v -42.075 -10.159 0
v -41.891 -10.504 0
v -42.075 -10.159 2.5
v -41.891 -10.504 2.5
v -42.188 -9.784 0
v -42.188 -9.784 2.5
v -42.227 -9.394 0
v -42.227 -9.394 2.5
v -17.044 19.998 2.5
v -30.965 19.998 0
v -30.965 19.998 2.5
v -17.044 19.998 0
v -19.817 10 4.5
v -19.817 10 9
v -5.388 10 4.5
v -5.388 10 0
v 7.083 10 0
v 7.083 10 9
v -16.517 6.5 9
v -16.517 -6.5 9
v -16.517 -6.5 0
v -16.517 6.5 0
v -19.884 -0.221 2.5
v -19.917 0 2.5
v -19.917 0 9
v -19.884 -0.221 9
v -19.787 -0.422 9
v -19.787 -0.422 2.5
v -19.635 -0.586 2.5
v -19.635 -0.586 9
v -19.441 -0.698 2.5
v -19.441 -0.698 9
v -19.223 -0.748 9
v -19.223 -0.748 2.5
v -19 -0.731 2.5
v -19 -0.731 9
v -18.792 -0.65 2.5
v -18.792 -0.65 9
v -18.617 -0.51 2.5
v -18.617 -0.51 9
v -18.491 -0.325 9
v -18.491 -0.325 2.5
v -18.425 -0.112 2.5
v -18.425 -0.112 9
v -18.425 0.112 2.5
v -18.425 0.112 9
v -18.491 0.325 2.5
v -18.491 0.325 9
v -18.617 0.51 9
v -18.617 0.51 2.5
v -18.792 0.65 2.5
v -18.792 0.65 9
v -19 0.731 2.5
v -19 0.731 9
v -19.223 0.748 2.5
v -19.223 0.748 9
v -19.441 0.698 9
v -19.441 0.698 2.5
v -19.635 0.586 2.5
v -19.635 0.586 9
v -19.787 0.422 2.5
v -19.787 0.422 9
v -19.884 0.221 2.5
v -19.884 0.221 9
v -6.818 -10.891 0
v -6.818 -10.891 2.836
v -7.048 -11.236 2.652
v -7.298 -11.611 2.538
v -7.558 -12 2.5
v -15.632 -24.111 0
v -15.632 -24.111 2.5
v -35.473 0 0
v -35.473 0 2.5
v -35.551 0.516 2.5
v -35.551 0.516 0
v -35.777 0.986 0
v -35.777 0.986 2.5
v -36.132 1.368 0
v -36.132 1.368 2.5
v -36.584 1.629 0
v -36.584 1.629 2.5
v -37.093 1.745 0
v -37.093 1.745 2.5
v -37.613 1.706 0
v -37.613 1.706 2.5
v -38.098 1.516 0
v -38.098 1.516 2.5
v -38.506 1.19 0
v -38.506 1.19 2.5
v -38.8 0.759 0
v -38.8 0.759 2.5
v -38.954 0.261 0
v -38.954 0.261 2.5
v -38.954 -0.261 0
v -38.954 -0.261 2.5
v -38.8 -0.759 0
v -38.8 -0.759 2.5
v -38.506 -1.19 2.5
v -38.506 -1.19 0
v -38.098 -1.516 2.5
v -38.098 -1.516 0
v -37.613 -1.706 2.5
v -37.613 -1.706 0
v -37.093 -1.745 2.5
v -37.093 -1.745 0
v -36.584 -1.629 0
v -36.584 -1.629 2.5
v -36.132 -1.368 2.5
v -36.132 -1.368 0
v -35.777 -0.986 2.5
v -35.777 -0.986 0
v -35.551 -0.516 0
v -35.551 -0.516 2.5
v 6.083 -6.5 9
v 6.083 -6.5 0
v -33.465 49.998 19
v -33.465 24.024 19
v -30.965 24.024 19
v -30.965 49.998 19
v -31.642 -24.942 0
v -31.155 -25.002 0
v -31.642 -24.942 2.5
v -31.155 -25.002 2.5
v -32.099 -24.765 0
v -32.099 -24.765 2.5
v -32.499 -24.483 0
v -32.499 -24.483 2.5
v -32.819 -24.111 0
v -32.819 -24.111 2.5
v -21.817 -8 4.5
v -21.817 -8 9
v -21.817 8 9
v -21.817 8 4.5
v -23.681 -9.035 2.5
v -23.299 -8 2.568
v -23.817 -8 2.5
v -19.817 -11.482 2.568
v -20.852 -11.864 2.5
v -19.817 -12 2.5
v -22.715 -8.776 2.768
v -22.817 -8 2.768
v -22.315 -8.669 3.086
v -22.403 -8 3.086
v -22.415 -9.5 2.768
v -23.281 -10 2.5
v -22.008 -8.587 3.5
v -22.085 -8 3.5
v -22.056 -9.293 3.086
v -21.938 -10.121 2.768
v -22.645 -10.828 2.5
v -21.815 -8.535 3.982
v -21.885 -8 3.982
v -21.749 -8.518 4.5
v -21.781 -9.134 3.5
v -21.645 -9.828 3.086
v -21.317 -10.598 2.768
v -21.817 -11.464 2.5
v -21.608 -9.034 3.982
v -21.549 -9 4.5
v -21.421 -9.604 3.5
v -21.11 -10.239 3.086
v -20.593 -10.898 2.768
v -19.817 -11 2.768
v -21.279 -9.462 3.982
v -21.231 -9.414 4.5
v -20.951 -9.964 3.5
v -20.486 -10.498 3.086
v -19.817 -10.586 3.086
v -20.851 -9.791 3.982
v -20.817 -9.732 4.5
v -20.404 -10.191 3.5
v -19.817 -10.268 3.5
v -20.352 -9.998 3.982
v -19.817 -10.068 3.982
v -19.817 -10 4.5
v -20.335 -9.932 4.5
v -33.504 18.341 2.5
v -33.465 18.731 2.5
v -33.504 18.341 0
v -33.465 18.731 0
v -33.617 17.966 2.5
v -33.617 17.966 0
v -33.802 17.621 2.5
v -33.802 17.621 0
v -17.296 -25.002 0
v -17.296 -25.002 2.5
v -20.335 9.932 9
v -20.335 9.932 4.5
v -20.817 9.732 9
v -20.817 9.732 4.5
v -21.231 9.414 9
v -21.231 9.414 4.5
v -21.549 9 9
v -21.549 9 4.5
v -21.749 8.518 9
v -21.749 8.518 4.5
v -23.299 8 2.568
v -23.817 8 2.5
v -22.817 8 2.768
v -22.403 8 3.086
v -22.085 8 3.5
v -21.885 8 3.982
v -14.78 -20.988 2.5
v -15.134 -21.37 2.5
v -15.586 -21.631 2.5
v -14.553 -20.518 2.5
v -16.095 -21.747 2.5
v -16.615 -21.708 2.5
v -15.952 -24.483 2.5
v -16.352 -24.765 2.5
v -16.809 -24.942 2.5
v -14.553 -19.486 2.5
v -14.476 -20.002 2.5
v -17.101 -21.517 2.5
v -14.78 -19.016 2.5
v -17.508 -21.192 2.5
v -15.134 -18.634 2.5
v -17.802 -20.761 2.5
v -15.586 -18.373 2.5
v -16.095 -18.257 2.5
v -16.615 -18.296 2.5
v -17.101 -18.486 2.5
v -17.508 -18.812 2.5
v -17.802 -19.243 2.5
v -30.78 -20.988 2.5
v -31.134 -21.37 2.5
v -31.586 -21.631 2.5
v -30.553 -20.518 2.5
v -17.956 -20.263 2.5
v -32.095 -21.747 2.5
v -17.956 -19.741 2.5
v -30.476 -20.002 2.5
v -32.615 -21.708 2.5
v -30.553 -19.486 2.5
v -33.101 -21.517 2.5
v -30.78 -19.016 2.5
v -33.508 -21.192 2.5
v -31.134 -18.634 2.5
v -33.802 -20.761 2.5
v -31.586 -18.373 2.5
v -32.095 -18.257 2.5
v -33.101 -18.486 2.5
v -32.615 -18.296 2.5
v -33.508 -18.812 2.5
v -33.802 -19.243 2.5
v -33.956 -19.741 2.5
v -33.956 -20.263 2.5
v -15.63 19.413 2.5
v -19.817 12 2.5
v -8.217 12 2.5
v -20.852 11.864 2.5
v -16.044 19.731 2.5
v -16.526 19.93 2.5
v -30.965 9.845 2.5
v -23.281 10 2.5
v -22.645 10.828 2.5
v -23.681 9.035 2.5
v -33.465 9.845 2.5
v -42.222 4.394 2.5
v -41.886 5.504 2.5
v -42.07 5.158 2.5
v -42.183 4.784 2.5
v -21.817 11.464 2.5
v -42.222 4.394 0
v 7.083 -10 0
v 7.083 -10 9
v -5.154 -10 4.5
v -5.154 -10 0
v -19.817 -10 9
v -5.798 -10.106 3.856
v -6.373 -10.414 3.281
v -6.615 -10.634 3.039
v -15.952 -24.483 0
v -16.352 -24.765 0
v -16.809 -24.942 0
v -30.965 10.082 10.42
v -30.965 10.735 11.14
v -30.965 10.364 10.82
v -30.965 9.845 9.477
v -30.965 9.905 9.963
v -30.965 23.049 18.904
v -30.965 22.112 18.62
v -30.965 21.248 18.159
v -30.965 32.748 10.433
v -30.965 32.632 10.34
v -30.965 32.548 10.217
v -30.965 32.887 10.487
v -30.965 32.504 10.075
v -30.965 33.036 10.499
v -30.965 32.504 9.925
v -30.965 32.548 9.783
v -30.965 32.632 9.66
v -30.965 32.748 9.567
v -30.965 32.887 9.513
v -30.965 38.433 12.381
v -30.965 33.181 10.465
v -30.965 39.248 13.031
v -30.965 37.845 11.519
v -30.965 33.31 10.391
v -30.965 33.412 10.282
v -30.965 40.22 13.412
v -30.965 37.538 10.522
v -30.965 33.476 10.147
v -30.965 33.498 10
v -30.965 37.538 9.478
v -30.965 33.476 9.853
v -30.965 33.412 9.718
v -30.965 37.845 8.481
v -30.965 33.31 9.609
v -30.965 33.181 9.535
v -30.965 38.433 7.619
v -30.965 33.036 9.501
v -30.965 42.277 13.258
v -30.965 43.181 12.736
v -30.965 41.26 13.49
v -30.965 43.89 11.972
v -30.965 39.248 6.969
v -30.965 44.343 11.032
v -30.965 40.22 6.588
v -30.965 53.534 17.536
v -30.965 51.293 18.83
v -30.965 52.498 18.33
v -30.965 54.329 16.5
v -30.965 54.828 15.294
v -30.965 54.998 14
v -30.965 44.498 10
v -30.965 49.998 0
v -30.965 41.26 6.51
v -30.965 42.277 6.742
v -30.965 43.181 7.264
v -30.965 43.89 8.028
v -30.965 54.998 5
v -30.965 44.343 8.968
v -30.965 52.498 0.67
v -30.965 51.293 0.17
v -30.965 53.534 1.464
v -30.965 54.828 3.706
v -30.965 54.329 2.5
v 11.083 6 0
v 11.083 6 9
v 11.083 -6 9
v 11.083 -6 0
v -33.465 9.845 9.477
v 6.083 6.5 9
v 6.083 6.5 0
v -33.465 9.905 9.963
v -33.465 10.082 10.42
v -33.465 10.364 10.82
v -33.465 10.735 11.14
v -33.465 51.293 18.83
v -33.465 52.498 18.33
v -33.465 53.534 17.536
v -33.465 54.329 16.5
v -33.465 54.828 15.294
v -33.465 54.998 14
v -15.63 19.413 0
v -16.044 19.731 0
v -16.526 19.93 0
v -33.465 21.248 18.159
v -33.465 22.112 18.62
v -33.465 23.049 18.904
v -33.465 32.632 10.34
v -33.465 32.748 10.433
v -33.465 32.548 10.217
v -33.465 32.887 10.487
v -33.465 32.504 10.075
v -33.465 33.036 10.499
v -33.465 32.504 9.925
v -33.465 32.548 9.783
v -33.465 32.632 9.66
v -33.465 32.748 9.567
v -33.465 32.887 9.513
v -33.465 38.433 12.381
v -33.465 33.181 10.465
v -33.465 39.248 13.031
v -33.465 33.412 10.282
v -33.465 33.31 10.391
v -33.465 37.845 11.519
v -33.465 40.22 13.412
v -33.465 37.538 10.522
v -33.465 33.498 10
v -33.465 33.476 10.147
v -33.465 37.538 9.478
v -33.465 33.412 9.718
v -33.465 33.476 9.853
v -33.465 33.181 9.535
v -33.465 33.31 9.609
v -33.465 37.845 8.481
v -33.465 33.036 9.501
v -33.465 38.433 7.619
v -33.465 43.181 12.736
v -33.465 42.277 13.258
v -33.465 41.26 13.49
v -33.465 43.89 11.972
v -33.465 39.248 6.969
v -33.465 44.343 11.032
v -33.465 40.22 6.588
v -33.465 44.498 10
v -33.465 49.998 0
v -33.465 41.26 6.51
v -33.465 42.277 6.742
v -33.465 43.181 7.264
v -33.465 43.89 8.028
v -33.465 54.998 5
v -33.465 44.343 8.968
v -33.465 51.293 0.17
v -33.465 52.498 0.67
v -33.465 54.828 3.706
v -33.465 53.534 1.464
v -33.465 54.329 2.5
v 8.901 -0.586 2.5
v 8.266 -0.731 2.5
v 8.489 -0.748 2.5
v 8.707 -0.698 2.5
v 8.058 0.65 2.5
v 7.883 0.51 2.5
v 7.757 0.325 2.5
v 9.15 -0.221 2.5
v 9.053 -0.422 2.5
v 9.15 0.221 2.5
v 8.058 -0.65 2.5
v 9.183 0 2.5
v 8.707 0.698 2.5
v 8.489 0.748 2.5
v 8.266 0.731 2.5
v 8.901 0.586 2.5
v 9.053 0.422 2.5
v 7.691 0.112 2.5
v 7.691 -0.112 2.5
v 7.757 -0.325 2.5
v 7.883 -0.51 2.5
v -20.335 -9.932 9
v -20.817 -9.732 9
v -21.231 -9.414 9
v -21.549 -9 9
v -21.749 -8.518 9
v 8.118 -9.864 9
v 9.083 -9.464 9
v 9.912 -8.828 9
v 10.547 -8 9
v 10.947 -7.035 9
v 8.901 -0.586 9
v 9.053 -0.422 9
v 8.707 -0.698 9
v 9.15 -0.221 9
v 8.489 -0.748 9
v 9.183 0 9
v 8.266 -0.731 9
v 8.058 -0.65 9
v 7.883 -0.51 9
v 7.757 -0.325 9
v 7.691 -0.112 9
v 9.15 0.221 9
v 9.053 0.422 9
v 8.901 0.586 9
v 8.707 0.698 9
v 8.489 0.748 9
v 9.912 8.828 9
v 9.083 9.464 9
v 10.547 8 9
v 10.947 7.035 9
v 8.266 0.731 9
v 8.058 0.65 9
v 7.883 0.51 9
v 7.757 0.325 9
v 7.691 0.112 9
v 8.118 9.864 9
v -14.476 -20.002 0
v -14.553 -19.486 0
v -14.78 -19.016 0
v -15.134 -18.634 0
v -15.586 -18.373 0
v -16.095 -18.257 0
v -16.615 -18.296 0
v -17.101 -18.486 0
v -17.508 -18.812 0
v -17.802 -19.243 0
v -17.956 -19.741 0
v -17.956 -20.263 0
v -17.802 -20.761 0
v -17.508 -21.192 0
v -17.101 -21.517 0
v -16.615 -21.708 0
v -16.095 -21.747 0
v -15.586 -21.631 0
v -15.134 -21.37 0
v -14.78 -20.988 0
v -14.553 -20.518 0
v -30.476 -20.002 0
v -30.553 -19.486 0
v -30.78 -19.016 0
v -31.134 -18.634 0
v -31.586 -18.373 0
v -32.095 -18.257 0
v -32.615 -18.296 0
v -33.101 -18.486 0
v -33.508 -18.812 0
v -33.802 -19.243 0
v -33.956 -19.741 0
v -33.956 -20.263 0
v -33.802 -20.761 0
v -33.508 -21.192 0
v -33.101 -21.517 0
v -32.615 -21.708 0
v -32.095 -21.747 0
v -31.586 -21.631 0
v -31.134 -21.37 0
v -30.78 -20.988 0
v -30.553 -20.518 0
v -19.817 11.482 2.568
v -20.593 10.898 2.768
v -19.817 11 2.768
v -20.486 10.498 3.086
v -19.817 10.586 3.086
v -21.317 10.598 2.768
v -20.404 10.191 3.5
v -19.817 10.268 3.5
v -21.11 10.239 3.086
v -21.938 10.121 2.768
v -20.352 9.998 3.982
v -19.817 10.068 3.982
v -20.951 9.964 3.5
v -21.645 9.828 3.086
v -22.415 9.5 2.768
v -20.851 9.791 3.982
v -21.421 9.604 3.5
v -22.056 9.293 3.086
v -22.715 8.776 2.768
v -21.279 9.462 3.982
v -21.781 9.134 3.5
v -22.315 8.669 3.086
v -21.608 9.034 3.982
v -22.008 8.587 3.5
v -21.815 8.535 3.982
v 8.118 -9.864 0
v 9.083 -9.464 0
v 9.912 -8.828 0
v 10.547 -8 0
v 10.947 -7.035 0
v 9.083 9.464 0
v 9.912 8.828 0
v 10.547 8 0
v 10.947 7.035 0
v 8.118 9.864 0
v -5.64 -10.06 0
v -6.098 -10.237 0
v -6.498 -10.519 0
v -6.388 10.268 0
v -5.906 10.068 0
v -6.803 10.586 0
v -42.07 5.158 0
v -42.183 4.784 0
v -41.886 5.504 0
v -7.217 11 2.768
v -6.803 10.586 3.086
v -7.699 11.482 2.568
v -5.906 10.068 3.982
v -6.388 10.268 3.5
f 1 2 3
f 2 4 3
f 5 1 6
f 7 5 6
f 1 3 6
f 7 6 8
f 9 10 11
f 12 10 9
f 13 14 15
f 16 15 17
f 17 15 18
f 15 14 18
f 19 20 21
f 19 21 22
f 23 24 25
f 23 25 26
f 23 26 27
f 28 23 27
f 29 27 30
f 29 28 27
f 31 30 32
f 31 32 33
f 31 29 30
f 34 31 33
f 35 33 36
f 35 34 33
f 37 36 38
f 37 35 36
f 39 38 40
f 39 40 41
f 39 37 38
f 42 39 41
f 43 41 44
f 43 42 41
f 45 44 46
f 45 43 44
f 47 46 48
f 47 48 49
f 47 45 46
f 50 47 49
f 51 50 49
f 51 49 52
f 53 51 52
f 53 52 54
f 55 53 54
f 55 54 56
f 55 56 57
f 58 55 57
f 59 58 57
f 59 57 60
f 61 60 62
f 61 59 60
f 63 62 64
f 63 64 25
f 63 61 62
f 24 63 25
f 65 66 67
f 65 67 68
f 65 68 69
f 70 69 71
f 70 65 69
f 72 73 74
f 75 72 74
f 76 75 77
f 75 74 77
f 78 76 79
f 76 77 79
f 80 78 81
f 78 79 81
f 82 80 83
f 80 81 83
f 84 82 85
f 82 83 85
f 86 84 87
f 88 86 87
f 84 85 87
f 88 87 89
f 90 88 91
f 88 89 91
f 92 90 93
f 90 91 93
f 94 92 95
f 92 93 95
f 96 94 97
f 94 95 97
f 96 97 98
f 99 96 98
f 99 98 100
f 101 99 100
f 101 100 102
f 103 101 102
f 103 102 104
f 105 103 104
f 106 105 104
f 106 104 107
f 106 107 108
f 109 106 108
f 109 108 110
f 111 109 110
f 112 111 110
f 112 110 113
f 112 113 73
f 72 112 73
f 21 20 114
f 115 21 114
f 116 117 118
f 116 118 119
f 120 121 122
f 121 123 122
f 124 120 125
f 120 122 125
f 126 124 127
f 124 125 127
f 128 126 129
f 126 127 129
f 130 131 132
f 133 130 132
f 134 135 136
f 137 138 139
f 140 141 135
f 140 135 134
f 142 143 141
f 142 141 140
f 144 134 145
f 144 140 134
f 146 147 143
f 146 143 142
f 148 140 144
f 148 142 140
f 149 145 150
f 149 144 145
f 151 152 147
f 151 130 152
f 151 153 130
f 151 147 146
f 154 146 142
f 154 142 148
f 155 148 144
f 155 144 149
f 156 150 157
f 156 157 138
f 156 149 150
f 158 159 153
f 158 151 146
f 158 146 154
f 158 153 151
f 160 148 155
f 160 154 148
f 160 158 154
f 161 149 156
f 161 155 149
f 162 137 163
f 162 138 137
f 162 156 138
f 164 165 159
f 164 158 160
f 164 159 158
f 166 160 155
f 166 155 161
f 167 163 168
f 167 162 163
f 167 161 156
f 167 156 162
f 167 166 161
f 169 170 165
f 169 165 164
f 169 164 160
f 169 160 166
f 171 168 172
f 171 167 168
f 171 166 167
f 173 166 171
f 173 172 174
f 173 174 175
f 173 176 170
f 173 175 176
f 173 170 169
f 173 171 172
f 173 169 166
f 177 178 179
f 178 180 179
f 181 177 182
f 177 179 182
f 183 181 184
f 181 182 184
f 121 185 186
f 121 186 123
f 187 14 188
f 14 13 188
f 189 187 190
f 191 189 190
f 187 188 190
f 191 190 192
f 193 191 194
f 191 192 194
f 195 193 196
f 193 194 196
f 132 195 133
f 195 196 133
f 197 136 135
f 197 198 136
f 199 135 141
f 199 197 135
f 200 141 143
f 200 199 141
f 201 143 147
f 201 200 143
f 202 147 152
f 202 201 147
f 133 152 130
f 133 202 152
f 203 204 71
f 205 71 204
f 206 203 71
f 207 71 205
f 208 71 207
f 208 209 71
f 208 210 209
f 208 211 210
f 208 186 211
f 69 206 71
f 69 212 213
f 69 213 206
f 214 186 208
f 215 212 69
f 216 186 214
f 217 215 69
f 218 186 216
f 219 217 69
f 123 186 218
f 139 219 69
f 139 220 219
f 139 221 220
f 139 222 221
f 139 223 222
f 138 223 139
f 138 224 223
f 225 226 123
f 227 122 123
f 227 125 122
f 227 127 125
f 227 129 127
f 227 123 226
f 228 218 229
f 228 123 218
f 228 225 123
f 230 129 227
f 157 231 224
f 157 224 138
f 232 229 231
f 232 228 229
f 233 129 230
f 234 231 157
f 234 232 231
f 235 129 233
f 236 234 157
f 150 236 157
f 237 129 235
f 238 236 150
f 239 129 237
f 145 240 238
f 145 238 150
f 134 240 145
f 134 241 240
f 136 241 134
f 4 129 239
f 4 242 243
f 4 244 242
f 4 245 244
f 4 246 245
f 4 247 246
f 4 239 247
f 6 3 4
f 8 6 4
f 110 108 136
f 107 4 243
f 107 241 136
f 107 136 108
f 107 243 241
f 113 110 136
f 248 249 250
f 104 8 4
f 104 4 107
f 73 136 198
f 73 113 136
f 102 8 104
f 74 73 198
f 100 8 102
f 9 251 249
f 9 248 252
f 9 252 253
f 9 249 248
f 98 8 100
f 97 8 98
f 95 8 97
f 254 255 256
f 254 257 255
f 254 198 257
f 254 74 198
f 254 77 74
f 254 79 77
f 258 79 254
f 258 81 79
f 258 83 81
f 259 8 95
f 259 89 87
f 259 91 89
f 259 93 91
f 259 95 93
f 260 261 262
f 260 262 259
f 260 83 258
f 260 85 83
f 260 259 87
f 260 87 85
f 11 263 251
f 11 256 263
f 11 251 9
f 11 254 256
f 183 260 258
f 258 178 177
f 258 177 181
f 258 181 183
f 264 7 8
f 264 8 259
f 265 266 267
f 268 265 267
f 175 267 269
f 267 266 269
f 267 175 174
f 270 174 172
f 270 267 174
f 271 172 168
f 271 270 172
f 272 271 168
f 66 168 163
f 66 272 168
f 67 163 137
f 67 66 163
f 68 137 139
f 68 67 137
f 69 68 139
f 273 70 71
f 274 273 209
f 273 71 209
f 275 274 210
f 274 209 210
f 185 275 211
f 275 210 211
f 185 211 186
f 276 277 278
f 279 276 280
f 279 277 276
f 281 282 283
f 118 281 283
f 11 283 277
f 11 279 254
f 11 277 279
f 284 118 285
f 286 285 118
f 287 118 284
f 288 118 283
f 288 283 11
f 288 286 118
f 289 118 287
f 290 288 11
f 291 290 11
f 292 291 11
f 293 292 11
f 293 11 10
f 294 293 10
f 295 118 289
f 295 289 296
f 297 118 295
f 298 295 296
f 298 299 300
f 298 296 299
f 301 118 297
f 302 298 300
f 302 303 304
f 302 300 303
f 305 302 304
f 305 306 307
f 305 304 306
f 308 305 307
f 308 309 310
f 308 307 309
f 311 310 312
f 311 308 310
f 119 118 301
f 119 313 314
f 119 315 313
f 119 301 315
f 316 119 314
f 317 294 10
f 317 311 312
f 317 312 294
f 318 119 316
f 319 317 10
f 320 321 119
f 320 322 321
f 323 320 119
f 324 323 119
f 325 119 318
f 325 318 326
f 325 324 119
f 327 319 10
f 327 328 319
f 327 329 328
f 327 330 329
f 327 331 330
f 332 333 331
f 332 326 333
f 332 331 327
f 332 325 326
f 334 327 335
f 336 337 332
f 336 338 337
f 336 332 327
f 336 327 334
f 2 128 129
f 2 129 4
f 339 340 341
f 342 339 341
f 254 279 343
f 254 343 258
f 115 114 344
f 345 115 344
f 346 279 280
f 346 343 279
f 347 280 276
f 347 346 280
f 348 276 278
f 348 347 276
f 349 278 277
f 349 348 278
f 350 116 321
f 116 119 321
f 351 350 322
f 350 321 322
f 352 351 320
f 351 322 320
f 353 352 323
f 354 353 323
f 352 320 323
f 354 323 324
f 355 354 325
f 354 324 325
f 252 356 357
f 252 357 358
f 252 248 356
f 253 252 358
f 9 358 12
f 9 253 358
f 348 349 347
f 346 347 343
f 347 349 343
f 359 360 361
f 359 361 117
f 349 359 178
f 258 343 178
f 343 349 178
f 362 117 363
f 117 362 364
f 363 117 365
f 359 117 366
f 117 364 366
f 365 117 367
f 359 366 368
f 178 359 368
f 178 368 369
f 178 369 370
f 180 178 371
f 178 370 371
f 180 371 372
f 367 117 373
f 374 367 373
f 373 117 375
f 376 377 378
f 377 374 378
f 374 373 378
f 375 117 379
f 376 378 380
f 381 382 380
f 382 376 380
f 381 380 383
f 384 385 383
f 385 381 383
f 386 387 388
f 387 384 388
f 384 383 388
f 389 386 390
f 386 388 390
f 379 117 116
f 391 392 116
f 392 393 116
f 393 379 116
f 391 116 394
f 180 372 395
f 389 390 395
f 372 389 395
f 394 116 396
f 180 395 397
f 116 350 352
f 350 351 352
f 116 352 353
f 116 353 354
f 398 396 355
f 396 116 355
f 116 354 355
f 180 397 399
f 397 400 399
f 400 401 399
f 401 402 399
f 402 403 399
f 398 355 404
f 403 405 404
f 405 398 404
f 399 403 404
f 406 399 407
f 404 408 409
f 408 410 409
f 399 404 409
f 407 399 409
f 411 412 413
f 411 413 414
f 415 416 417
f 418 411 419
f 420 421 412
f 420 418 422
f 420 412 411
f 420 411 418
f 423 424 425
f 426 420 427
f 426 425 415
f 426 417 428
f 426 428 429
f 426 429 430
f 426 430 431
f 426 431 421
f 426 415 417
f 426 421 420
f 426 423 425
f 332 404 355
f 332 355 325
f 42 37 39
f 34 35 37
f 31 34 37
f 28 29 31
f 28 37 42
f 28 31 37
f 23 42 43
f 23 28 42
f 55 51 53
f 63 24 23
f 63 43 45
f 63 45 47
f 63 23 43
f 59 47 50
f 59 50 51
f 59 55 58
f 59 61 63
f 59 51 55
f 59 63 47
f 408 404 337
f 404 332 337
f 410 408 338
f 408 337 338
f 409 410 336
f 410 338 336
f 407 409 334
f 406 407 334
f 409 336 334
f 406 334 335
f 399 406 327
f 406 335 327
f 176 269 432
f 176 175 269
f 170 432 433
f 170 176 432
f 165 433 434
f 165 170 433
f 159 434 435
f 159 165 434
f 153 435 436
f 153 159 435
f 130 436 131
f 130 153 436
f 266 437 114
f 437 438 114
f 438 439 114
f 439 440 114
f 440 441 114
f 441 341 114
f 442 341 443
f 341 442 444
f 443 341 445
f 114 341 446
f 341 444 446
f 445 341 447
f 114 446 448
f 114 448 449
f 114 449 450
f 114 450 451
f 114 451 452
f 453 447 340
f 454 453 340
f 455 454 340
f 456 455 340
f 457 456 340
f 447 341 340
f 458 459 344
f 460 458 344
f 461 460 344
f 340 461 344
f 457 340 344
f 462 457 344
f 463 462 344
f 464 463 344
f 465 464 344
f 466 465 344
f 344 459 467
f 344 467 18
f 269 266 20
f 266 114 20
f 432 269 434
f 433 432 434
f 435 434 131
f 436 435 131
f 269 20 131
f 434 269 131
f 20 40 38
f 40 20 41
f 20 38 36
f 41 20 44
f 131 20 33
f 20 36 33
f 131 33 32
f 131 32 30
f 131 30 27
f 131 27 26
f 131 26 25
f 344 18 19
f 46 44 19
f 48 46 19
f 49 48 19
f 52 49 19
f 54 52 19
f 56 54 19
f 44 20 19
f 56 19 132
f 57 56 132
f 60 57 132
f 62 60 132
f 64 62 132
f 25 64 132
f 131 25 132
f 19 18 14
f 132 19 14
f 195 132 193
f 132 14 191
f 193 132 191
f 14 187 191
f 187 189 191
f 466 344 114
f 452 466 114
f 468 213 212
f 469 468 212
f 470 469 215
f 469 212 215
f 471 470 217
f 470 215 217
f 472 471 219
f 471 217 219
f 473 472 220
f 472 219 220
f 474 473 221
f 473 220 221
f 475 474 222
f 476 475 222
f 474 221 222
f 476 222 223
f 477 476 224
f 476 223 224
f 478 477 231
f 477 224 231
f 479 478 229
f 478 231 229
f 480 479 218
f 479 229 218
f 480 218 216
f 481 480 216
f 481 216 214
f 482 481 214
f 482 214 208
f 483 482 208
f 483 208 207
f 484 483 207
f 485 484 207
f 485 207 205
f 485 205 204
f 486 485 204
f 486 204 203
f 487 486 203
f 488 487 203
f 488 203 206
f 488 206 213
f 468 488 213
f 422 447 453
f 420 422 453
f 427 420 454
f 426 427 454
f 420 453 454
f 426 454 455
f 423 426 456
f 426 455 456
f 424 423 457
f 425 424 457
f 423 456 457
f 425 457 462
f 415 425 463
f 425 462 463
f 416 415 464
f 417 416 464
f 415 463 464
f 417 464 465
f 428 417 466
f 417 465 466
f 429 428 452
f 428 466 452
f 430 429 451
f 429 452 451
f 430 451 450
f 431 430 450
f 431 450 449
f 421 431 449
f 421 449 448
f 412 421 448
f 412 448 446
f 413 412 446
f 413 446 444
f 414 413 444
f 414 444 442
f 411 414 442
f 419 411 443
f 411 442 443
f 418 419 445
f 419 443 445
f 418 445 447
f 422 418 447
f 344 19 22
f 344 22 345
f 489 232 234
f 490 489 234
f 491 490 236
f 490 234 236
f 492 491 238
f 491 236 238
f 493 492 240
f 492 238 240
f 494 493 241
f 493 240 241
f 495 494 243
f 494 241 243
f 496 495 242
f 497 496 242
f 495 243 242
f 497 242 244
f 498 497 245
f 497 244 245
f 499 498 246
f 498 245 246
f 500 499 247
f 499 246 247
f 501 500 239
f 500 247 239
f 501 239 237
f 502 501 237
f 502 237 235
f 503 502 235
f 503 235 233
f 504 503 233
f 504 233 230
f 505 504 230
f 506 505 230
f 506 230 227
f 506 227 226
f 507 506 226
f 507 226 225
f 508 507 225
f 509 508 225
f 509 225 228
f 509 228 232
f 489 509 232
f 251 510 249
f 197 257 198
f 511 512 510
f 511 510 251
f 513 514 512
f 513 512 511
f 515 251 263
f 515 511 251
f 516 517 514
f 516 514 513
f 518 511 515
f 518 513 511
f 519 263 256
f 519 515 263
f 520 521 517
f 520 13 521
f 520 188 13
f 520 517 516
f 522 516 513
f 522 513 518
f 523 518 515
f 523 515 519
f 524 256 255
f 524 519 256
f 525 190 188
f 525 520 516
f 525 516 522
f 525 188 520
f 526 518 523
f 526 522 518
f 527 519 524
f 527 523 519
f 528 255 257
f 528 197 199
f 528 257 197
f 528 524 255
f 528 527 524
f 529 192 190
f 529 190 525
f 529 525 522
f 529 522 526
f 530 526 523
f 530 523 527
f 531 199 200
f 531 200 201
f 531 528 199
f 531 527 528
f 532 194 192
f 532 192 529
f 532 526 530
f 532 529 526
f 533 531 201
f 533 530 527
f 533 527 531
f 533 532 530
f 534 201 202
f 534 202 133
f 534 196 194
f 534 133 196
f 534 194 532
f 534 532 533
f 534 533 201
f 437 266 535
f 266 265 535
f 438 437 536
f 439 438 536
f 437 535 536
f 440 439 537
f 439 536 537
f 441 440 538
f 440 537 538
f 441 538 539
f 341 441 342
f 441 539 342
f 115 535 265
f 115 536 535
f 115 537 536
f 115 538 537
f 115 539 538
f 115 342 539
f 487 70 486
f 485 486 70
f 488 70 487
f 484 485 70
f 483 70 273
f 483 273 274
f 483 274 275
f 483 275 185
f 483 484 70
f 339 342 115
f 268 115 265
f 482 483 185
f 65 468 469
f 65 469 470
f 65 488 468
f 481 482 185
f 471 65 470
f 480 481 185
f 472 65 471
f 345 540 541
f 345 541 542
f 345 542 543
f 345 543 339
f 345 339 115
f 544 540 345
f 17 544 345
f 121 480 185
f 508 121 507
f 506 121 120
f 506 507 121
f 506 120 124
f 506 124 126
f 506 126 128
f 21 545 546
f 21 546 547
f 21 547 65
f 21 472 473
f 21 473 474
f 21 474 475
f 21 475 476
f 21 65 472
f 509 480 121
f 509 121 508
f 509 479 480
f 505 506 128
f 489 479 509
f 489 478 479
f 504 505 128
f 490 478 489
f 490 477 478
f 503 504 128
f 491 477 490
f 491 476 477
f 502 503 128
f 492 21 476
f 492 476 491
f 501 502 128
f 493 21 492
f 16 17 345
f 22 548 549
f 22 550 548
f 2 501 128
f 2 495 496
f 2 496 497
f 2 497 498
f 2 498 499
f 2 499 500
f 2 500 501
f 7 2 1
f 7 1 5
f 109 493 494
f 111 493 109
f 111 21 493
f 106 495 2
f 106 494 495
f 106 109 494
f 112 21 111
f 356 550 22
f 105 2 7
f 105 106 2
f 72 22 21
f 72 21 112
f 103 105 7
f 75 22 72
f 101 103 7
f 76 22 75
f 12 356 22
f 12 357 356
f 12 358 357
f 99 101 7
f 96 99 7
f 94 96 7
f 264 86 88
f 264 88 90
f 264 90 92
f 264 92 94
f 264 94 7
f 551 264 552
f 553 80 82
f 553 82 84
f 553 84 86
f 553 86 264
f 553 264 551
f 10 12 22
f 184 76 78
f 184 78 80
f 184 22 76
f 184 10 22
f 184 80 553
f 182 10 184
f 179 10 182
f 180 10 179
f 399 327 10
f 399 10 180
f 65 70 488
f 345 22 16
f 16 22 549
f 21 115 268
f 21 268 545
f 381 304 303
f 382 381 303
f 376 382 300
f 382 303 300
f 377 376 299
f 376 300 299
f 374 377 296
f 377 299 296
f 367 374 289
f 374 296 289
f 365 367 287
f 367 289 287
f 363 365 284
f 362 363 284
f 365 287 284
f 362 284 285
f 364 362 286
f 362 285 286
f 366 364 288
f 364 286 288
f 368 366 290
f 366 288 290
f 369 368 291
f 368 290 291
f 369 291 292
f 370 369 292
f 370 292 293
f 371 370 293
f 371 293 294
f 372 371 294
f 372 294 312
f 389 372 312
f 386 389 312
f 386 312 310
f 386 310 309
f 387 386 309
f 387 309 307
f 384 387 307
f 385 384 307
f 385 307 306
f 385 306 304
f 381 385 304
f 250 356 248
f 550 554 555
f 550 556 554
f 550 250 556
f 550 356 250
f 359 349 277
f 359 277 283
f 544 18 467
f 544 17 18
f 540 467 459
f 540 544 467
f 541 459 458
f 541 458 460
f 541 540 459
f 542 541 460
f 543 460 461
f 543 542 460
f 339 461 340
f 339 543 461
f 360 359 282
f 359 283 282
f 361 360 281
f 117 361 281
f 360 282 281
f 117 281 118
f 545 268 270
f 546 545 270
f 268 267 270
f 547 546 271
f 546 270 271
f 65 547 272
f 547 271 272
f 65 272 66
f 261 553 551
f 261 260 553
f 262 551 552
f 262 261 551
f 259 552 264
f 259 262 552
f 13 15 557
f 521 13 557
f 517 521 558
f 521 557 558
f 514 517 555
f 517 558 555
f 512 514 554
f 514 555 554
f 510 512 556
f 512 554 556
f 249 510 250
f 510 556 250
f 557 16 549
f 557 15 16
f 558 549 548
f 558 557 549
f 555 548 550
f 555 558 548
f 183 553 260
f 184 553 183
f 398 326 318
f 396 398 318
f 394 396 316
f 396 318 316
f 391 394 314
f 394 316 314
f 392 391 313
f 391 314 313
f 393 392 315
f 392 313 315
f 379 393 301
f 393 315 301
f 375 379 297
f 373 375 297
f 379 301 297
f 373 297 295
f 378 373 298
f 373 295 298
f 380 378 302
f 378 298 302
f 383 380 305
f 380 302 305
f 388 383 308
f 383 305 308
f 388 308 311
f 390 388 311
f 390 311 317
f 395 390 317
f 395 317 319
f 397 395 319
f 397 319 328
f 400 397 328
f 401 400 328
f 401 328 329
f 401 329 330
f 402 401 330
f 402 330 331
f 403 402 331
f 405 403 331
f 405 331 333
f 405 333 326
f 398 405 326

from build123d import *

# Parameters (mm, degrees)
BOSS_EXTRUDE1_DEPTH = 2.5
SKETCH6_R           = 1.75
SKETCH6_W           = 10.8
SKETCH6_H           = 10.8
CUT_EXTRUDE1_DEPTH  = 50.137003564
FILLET1_R           = 5.4
FILLET2_R           = 5.4
FILLET3_RADIUS      = 10
FILLET3_LENGTH      = 2.5
SKETCH7_W           = 35
SKETCH7_H           = 20
SKETCH7_W_2         = 23
SKETCH7_H_2         = 13
BOSS_EXTRUDE2_DEPTH = 6.5
CUT_EXTRUDE2_DEPTH  = 5.5
FILLET4_R           = 4
SKETCH9_W           = 2.5
SKETCH9_H           = 24
BOSS_EXTRUDE3_DEPTH = 35
SKETCH11_R          = 3.5
SKETCH11_R_2        = 0.5
CUT_EXTRUDE3_DEPTH  = 72.106548013
FILLET5_R           = 5
BOSS_EXTRUDE4_DEPTH = 2.5
CUT_EXTRUDE5_DEPTH  = 73.478504536
SKETCH17_W          = 5.3
SKETCH17_H          = 13
SKETCH17_R          = 0.75
BOSS_EXTRUDE5_DEPTH = 6.5
BOSS_EXTRUDE6_DEPTH = 9
SKETCH22_W          = 12.144268415
SKETCH22_H          = 32.489830624
CUT_EXTRUDE11_DEPTH = 75.735546033
FILLET11_R          = 5
SKETCH23_R          = 0.75
CUT_EXTRUDE12_DEPTH = 6.5
FILLET12_R          = 4
SKETCH24_W          = 4.9
SKETCH24_H          = 13
CUT_EXTRUDE13_DEPTH = 6.5
SKETCH26_W          = 22.6
SKETCH26_H          = 13
CUT_EXTRUDE14_DEPTH = 10
SKETCH29_W          = 6
SKETCH29_H          = 20
CUT_EXTRUDE15_DEPTH = 6.5
FILLET13_R          = 2
FILLET14_R          = 2


# Some blends are built 0.0001 mm under size
with BuildPart() as part:
    # Sketch1 → Boss-Extrude1 (new body)
    with BuildSketch(Plane.XY):
        Polygon((17.783093717, 10), (17.783093717, -10), (-6.22432909, -10), (-16.225555947, -25.001878594), (-32.225555947, -25.001878594), (-42.226782805, -10), (-42.221702947, 4.99999914), (-32.215396169, 19.998489886), (-16.215396169, 19.998489886), (-6.216906283, 10), align=None)
    extrude(amount=BOSS_EXTRUDE1_DEPTH)

    # Sketch6 → Cut-Extrude1 (cut, through all)
    with BuildSketch(Plane.XY.offset(2.5)):
        with Locations((-37.223395946, 0)):
            Circle(SKETCH6_R)
        with Locations((-32.225555947, -20.001878594)):
            Circle(SKETCH6_R)
        with Locations((-16.225555947, -20.001878594)):
            Circle(SKETCH6_R)
        with Locations((-10.316906283, 0)):
            Rectangle(SKETCH6_W, SKETCH6_H)
    extrude(amount=-CUT_EXTRUDE1_DEPTH, mode=Mode.SUBTRACT)

    # Fillet1
    fillet1_edges = [part.edges().sort_by_distance(p)[0] for p in [
        (-15.716906283, -5.4, 1.25),
        (-15.716906283, 5.4, 1.25),
    ]]
    fillet(fillet1_edges, radius=FILLET1_R - 0.0001)  # a hair under: the kernel refuses the full size

    # Fillet2
    # the kernel refuses this fillet: 5.4 mm, written as the material it adds along each edge
    with BuildSketch(Plane(origin=(-4.916906283, 5.4, 2.5), x_dir=(0, -1, 0), z_dir=(0, 0, -1)), Plane(origin=(-4.916906283, -5.4, 2.5), x_dir=(-1, 0, 0), z_dir=(0, 0, -1))) as fillet2_piece_1:
        with BuildLine():
            CenterArc((FILLET2_R, FILLET2_R), FILLET2_R, 180, 90)
            Line((0, FILLET2_R), (0, 0))
            Line((0, 0), (FILLET2_R, 0))
        make_face()
    extrude(amount=2.5)
    # the kernel refuses this fillet: 5.4 mm, written as the material it takes off along each edge

    # Fillet3: full round fillet: the end face becomes a half cylinder, R = half its width
    fillet3_face = Plane((17.783093717, 0, 1.25), x_dir=(0, 0, 1), z_dir=(1, 0, 0))  # on the end face: x along it, z out of the body
    fillet3_slab = fillet3_face.offset(-FILLET3_RADIUS / 2) * Box(FILLET3_LENGTH, 2 * FILLET3_RADIUS, FILLET3_RADIUS, mode=Mode.PRIVATE)  # the body's end, R deep
    fillet3_round = Plane((7.783093717, 0, 1.25), x_dir=(1, 0, 0), z_dir=(0, 0, 1)) * Cylinder(FILLET3_RADIUS, FILLET3_LENGTH, mode=Mode.PRIVATE)  # its axis R under the face
    add(fillet3_slab - fillet3_round, mode=Mode.SUBTRACT)

    # Sketch7 → Boss-Extrude2 (add)
    with BuildSketch(Plane.XY.offset(2.5)):
        with Locations((-10.316906283, 0)):
            Rectangle(SKETCH7_W, SKETCH7_H)
        with Locations((-10.316906283, 0)):
            Rectangle(SKETCH7_W_2, SKETCH7_H_2, mode=Mode.SUBTRACT)
    extrude(amount=BOSS_EXTRUDE2_DEPTH)

    # Sketch8 → Cut-Extrude2 (cut)
    with BuildSketch(Plane.XY.offset(2.5)):
        with BuildLine():
            Line((7.183093717, 10), (7.183093717, -10))
            Line((7.183093717, -10), (7.783093717, -10))
            ThreePointArc((7.783093717, -10), (17.783093717, 0), (7.783093717, 10))
            Line((7.783093717, 10), (7.183093717, 10))
        make_face()
    extrude(amount=-CUT_EXTRUDE2_DEPTH, mode=Mode.SUBTRACT)

    # Fillet4
    fillet4_edges = [part.edges().sort_by_distance(p)[0] for p in [
        (7.183093717, -10, 4.5),
        (7.183093717, 10, 4.5),
    ]]
    fillet(fillet4_edges, radius=FILLET4_R)

    # Sketch9 → Boss-Extrude3 (add)
    with BuildSketch(Plane(origin=(0, 19.998489886, 0), x_dir=(1, 0, 0), z_dir=(0, 1, 0))):
        with Locations((-32.215396169, -12)):
            Rectangle(SKETCH9_W, SKETCH9_H)
    extrude(amount=BOSS_EXTRUDE3_DEPTH)

    # Sketch11 → Cut-Extrude3 (cut, through all)
    with BuildSketch(Plane(origin=(-30.965396169, 0, 0), x_dir=(0, 0, -1), z_dir=(1, 0, 0))):
        with Locations(Location((-10, 40.998489886, 0), (0, 0, 90))):
            Circle(SKETCH11_R)
        with Locations(Location((-10, 32.998489886, 0), (0, 0, 90))):
            Circle(SKETCH11_R_2)
    extrude(amount=-CUT_EXTRUDE3_DEPTH, mode=Mode.SUBTRACT)

    # Fillet5
    fillet5_edges = [part.edges().sort_by_distance(p)[0] for p in [
        (-32.215396169, 54.998489886, 0),
        (-32.215396169, 54.998489886, 24),
    ]]
    fillet(fillet5_edges, radius=FILLET5_R)

    # Sketch14 → Boss-Extrude4 (add)
    with BuildSketch(Plane(origin=(-30.965396169, 0, 0), x_dir=(0, 0, -1), z_dir=(1, 0, 0))):
        Polygon((-24, 19.998489886), (-10.54641456, 9.845474641), (0, 9.845474641), (0, 19.998489886), align=None)
    extrude(amount=-BOSS_EXTRUDE4_DEPTH)

    # Sketch16 → Cut-Extrude5 (cut, through all)
    with BuildSketch(Plane.ZY.offset(33.465396169)):
        Polygon((10.54641456, 9.845474641), (24, 29.998489886), (24, 19.998489886), align=None)
    extrude(amount=-CUT_EXTRUDE5_DEPTH, mode=Mode.SUBTRACT)

    # Sketch17 → Boss-Extrude5 (add)
    with BuildSketch(Plane.XY.offset(2.5)):
        with Locations((-19.166906283, 0)):
            Rectangle(SKETCH17_W, SKETCH17_H)
        with Locations(Location((-19.166906283, 0, 0), (0, 0, 180))):
            Circle(SKETCH17_R, mode=Mode.SUBTRACT)
    extrude(amount=BOSS_EXTRUDE5_DEPTH)

    # Sketch18 → Boss-Extrude6 (add)
    with BuildSketch(Plane.XY.offset(9)):
        with BuildLine():
            Line((3.183093717, 10), (11.083093717, 10))
            Line((11.083093717, 10), (11.083093717, -10))
            Line((11.083093717, -10), (3.183093717, -10))
            ThreePointArc((3.183093717, -10), (6.011520842, -8.828427125), (7.183093717, -6))
            Line((7.183093717, -6), (7.183093717, 6))
            ThreePointArc((7.183093717, 6), (6.011520842, 8.828427125), (3.183093717, 10))
        make_face()
    extrude(amount=-BOSS_EXTRUDE6_DEPTH)

    # Sketch22 → Cut-Extrude11 (cut, through all)
    with BuildSketch(Plane.ZY.offset(33.465396169)):
        with Locations((25.072134207, 38.753574574)):
            Rectangle(SKETCH22_W, SKETCH22_H)
    extrude(amount=-CUT_EXTRUDE11_DEPTH, mode=Mode.SUBTRACT)

    # Fillet11
    fillet11_edges = [part.edges().sort_by_distance(p)[0] for p in [
        (-32.215396169, 54.998489886, 19),
        (-32.215396169, 22.508659262, 19),
    ]]
    fillet(fillet11_edges, radius=FILLET11_R)

    # Sketch23 → Cut-Extrude12 (cut)
    with BuildSketch(Plane.XY.offset(9)):
        with Locations((8.433093717, 0)):
            Circle(SKETCH23_R)
    extrude(amount=-CUT_EXTRUDE12_DEPTH, mode=Mode.SUBTRACT)

    # Fillet12
    fillet12_edges = [part.edges().sort_by_distance(p)[0] for p in [
        (11.083093717, -10, 4.5),
        (11.083093717, 10, 4.5),
    ]]
    fillet(fillet12_edges, radius=FILLET12_R)

    # Sketch24 → Cut-Extrude13 (cut)
    with BuildSketch(Plane.XY.offset(9)):
        with Locations((3.633093717, 0)):
            Rectangle(SKETCH24_W, SKETCH24_H)
    extrude(amount=-CUT_EXTRUDE13_DEPTH, mode=Mode.SUBTRACT)

    # Sketch26 → Cut-Extrude14 (cut)
    with BuildSketch(Plane.XY.offset(2.5)):
        with Locations((-5.216906283, 0)):
            Rectangle(SKETCH26_W, SKETCH26_H)
    extrude(amount=-CUT_EXTRUDE14_DEPTH, mode=Mode.SUBTRACT)

    # Sketch29 → Cut-Extrude15 (cut)
    with BuildSketch(Plane.XY.offset(9)):
        with Locations((-24.816906283, 0)):
            Rectangle(SKETCH29_W, SKETCH29_H)
    extrude(amount=-CUT_EXTRUDE15_DEPTH, mode=Mode.SUBTRACT)

    # Fillet13
    fillet13_edges = [part.edges().sort_by_distance(p)[0] for p in [
        (-6.22432909, -10, 1.25),
        (-16.225555947, -25.001878594, 1.25),
        (-32.225555947, -25.001878594, 1.25),
        (-42.226782805, -10, 1.25),
        (-42.221702947, 4.99999914, 1.25),
        (-16.215396169, 19.998489886, 1.25),
        (-6.216906283, 10, 1.25),
        (-33.465396169, 18.124860199, 1.25),
        (-14.020617686, -10, 2.5),
        (-21.816906283, -10, 5.75),
        (-21.816906283, 0, 2.5),
        (-21.816906283, 10, 5.75),
        (-14.016906283, 10, 2.5),
    ]]
    fillet(fillet13_edges, radius=FILLET13_R)

    # Fillet14
    fillet14_edges = [part.edges().sort_by_distance(p)[0] for p in [
        (-32.215396169, 9.845474641, 10.54641456),
    ]]
    fillet(fillet14_edges, radius=FILLET14_R)


solid = part.part
